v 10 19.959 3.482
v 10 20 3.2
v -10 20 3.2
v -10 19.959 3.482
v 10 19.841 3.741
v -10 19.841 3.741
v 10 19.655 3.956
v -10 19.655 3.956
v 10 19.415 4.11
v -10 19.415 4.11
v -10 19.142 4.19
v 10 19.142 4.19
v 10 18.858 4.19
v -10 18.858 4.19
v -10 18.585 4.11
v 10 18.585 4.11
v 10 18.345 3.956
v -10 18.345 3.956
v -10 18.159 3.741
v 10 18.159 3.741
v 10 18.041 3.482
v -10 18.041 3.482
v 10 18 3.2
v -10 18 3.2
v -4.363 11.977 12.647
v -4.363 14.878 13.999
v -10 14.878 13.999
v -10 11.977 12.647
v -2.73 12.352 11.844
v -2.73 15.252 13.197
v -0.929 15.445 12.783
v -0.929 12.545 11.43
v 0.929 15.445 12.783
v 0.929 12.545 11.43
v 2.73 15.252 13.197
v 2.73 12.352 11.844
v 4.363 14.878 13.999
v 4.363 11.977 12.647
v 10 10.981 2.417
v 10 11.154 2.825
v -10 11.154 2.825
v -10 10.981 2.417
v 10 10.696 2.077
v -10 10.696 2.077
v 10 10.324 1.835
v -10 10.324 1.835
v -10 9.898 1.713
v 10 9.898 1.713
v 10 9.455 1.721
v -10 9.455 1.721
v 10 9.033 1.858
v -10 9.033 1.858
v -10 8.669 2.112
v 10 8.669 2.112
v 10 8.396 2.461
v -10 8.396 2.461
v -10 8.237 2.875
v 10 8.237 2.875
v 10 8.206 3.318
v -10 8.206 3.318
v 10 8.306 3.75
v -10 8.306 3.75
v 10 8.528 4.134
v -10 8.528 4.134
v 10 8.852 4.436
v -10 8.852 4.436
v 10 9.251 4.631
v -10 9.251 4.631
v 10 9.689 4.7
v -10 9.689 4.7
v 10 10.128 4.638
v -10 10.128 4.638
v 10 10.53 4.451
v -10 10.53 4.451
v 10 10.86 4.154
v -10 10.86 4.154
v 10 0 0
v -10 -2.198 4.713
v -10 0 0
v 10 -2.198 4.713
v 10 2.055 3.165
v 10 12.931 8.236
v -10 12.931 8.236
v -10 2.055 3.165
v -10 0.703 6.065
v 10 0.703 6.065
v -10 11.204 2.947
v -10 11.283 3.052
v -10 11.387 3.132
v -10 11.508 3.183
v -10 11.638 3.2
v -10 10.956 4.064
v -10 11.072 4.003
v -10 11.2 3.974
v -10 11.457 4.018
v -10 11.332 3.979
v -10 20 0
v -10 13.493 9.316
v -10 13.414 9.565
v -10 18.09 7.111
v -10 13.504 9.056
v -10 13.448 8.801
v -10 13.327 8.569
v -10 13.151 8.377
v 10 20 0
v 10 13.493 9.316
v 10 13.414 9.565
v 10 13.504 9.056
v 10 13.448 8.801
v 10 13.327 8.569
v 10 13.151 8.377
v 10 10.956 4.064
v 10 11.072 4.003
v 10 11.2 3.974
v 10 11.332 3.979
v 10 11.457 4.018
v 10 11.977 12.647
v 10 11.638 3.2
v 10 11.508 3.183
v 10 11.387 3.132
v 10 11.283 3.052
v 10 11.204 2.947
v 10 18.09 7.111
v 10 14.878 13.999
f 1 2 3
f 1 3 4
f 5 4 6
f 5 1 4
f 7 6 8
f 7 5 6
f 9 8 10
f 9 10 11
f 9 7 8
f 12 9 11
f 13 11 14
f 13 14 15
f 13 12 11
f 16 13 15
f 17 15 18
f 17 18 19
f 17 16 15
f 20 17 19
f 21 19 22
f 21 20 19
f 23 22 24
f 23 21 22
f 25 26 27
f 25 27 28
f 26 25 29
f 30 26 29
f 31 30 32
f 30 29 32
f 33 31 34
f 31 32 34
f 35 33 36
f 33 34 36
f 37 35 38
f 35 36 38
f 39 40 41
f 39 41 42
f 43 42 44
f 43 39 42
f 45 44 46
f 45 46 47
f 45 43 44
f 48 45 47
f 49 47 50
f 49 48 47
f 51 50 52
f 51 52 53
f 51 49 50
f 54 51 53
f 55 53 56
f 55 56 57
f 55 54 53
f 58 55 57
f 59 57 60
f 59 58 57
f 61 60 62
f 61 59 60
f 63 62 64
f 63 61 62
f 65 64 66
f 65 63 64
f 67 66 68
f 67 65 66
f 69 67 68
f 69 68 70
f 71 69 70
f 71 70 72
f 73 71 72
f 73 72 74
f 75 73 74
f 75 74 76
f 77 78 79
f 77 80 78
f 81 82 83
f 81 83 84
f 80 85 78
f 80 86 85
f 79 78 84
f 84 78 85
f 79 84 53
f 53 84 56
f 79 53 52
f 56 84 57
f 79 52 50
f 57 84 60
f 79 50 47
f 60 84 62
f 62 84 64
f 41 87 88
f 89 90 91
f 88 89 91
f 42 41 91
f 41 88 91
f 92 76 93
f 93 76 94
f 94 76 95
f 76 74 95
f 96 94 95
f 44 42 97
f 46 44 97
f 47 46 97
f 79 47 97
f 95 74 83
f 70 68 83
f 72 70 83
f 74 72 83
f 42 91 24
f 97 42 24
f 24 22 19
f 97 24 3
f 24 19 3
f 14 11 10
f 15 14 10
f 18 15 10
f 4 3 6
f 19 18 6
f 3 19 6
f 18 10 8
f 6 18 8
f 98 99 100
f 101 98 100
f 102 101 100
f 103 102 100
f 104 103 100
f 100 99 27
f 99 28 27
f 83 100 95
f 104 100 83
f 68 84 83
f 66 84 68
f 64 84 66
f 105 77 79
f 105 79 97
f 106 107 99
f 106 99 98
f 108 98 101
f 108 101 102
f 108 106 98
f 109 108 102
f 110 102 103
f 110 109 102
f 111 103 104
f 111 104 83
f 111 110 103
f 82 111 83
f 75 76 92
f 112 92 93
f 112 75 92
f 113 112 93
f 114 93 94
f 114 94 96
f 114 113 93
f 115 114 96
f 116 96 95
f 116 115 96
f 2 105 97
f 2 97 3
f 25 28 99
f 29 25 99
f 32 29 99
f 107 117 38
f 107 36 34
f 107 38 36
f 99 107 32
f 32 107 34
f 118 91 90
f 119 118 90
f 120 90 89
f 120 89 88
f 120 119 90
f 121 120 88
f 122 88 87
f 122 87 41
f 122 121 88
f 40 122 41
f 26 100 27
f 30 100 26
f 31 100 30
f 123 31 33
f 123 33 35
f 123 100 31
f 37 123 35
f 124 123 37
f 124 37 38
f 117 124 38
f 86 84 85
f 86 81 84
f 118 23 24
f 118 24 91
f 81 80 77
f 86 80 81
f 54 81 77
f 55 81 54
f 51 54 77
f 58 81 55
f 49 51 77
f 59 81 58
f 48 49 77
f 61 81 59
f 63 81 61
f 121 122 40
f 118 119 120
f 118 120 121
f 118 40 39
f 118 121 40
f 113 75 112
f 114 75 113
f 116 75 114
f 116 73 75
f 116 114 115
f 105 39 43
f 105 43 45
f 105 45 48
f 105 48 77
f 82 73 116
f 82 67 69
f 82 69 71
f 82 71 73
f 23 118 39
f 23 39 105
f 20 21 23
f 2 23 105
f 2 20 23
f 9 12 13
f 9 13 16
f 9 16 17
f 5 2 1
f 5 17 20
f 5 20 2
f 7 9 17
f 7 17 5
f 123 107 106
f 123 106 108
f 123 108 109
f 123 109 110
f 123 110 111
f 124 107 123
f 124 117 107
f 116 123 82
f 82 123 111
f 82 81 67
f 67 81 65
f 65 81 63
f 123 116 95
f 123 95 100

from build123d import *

# Parameters (mm, degrees)
F1_DEPTH = 10
F3_DEPTH = 3.2


with BuildPart() as f1:
    # F0 (on Right) → F1 (new body, symmetric)
    with BuildSketch(Plane.YZ):
        with BuildLine():
            Line((-2.1976149611, 4.7128004926), (0, 0))
            Line((0, 0), (20, 0))
            Line((20, 0), (20, 3.2))
            ThreePointArc((20, 3.2), (19, 4.2), (18, 3.2))
            Line((18, 3.2), (11.6383557185, 3.2))
            ThreePointArc((11.6383557185, 3.2), (11.3321695007, 3.0952847075), (11.1542328002, 2.825))
            ThreePointArc((11.1542328002, 2.825), (8.2374200347, 2.8753405791), (10.8596753094, 4.1536629787))
            ThreePointArc((10.8596753094, 4.1536629787), (11.1351679799, 3.9839011426), (11.4569215283, 4.0183967448))
            Line((11.4569215283, 4.0183967448), (18.0895129826, 7.1112249333))
            Line((18.0895129826, 7.1112249333), (14.8776141934, 13.9991641148))
            Line((14.8776141934, 13.9991641148), (11.9774292749, 12.6467856772))
            Line((11.9774292749, 12.6467856772), (13.4143313648, 9.5653392013))
            ThreePointArc((13.4143313648, 9.5653392013), (13.4477161985, 8.8007007962), (12.9306418395, 8.2364131525))
            Line((12.9306418395, 8.2364131525), (2.054948395, 3.1649940116))
            Line((2.054948395, 3.1649940116), (0.7025699575, 6.0651789302))
            Line((0.7025699575, 6.0651789302), (-2.1976149611, 4.7128004926))
        make_face()
    extrude(amount=F1_DEPTH, both=True)

    # F2 (on face) → F3 (cut, through all)
    with BuildSketch(Plane(origin=(0, 14.68218615, 6.8464158402), x_dir=(1, 0, 0), z_dir=(0, -0.906307787, -0.4226182617))):
        with BuildLine():
            Line((4.3634848459, 6.4), (-4.3634848459, 6.4))
            ThreePointArc((-4.3634848459, 6.4), (0, 5), (4.3634848459, 6.4))
        make_face()
    extrude(amount=-F3_DEPTH, mode=Mode.SUBTRACT)


solid = f1.part
